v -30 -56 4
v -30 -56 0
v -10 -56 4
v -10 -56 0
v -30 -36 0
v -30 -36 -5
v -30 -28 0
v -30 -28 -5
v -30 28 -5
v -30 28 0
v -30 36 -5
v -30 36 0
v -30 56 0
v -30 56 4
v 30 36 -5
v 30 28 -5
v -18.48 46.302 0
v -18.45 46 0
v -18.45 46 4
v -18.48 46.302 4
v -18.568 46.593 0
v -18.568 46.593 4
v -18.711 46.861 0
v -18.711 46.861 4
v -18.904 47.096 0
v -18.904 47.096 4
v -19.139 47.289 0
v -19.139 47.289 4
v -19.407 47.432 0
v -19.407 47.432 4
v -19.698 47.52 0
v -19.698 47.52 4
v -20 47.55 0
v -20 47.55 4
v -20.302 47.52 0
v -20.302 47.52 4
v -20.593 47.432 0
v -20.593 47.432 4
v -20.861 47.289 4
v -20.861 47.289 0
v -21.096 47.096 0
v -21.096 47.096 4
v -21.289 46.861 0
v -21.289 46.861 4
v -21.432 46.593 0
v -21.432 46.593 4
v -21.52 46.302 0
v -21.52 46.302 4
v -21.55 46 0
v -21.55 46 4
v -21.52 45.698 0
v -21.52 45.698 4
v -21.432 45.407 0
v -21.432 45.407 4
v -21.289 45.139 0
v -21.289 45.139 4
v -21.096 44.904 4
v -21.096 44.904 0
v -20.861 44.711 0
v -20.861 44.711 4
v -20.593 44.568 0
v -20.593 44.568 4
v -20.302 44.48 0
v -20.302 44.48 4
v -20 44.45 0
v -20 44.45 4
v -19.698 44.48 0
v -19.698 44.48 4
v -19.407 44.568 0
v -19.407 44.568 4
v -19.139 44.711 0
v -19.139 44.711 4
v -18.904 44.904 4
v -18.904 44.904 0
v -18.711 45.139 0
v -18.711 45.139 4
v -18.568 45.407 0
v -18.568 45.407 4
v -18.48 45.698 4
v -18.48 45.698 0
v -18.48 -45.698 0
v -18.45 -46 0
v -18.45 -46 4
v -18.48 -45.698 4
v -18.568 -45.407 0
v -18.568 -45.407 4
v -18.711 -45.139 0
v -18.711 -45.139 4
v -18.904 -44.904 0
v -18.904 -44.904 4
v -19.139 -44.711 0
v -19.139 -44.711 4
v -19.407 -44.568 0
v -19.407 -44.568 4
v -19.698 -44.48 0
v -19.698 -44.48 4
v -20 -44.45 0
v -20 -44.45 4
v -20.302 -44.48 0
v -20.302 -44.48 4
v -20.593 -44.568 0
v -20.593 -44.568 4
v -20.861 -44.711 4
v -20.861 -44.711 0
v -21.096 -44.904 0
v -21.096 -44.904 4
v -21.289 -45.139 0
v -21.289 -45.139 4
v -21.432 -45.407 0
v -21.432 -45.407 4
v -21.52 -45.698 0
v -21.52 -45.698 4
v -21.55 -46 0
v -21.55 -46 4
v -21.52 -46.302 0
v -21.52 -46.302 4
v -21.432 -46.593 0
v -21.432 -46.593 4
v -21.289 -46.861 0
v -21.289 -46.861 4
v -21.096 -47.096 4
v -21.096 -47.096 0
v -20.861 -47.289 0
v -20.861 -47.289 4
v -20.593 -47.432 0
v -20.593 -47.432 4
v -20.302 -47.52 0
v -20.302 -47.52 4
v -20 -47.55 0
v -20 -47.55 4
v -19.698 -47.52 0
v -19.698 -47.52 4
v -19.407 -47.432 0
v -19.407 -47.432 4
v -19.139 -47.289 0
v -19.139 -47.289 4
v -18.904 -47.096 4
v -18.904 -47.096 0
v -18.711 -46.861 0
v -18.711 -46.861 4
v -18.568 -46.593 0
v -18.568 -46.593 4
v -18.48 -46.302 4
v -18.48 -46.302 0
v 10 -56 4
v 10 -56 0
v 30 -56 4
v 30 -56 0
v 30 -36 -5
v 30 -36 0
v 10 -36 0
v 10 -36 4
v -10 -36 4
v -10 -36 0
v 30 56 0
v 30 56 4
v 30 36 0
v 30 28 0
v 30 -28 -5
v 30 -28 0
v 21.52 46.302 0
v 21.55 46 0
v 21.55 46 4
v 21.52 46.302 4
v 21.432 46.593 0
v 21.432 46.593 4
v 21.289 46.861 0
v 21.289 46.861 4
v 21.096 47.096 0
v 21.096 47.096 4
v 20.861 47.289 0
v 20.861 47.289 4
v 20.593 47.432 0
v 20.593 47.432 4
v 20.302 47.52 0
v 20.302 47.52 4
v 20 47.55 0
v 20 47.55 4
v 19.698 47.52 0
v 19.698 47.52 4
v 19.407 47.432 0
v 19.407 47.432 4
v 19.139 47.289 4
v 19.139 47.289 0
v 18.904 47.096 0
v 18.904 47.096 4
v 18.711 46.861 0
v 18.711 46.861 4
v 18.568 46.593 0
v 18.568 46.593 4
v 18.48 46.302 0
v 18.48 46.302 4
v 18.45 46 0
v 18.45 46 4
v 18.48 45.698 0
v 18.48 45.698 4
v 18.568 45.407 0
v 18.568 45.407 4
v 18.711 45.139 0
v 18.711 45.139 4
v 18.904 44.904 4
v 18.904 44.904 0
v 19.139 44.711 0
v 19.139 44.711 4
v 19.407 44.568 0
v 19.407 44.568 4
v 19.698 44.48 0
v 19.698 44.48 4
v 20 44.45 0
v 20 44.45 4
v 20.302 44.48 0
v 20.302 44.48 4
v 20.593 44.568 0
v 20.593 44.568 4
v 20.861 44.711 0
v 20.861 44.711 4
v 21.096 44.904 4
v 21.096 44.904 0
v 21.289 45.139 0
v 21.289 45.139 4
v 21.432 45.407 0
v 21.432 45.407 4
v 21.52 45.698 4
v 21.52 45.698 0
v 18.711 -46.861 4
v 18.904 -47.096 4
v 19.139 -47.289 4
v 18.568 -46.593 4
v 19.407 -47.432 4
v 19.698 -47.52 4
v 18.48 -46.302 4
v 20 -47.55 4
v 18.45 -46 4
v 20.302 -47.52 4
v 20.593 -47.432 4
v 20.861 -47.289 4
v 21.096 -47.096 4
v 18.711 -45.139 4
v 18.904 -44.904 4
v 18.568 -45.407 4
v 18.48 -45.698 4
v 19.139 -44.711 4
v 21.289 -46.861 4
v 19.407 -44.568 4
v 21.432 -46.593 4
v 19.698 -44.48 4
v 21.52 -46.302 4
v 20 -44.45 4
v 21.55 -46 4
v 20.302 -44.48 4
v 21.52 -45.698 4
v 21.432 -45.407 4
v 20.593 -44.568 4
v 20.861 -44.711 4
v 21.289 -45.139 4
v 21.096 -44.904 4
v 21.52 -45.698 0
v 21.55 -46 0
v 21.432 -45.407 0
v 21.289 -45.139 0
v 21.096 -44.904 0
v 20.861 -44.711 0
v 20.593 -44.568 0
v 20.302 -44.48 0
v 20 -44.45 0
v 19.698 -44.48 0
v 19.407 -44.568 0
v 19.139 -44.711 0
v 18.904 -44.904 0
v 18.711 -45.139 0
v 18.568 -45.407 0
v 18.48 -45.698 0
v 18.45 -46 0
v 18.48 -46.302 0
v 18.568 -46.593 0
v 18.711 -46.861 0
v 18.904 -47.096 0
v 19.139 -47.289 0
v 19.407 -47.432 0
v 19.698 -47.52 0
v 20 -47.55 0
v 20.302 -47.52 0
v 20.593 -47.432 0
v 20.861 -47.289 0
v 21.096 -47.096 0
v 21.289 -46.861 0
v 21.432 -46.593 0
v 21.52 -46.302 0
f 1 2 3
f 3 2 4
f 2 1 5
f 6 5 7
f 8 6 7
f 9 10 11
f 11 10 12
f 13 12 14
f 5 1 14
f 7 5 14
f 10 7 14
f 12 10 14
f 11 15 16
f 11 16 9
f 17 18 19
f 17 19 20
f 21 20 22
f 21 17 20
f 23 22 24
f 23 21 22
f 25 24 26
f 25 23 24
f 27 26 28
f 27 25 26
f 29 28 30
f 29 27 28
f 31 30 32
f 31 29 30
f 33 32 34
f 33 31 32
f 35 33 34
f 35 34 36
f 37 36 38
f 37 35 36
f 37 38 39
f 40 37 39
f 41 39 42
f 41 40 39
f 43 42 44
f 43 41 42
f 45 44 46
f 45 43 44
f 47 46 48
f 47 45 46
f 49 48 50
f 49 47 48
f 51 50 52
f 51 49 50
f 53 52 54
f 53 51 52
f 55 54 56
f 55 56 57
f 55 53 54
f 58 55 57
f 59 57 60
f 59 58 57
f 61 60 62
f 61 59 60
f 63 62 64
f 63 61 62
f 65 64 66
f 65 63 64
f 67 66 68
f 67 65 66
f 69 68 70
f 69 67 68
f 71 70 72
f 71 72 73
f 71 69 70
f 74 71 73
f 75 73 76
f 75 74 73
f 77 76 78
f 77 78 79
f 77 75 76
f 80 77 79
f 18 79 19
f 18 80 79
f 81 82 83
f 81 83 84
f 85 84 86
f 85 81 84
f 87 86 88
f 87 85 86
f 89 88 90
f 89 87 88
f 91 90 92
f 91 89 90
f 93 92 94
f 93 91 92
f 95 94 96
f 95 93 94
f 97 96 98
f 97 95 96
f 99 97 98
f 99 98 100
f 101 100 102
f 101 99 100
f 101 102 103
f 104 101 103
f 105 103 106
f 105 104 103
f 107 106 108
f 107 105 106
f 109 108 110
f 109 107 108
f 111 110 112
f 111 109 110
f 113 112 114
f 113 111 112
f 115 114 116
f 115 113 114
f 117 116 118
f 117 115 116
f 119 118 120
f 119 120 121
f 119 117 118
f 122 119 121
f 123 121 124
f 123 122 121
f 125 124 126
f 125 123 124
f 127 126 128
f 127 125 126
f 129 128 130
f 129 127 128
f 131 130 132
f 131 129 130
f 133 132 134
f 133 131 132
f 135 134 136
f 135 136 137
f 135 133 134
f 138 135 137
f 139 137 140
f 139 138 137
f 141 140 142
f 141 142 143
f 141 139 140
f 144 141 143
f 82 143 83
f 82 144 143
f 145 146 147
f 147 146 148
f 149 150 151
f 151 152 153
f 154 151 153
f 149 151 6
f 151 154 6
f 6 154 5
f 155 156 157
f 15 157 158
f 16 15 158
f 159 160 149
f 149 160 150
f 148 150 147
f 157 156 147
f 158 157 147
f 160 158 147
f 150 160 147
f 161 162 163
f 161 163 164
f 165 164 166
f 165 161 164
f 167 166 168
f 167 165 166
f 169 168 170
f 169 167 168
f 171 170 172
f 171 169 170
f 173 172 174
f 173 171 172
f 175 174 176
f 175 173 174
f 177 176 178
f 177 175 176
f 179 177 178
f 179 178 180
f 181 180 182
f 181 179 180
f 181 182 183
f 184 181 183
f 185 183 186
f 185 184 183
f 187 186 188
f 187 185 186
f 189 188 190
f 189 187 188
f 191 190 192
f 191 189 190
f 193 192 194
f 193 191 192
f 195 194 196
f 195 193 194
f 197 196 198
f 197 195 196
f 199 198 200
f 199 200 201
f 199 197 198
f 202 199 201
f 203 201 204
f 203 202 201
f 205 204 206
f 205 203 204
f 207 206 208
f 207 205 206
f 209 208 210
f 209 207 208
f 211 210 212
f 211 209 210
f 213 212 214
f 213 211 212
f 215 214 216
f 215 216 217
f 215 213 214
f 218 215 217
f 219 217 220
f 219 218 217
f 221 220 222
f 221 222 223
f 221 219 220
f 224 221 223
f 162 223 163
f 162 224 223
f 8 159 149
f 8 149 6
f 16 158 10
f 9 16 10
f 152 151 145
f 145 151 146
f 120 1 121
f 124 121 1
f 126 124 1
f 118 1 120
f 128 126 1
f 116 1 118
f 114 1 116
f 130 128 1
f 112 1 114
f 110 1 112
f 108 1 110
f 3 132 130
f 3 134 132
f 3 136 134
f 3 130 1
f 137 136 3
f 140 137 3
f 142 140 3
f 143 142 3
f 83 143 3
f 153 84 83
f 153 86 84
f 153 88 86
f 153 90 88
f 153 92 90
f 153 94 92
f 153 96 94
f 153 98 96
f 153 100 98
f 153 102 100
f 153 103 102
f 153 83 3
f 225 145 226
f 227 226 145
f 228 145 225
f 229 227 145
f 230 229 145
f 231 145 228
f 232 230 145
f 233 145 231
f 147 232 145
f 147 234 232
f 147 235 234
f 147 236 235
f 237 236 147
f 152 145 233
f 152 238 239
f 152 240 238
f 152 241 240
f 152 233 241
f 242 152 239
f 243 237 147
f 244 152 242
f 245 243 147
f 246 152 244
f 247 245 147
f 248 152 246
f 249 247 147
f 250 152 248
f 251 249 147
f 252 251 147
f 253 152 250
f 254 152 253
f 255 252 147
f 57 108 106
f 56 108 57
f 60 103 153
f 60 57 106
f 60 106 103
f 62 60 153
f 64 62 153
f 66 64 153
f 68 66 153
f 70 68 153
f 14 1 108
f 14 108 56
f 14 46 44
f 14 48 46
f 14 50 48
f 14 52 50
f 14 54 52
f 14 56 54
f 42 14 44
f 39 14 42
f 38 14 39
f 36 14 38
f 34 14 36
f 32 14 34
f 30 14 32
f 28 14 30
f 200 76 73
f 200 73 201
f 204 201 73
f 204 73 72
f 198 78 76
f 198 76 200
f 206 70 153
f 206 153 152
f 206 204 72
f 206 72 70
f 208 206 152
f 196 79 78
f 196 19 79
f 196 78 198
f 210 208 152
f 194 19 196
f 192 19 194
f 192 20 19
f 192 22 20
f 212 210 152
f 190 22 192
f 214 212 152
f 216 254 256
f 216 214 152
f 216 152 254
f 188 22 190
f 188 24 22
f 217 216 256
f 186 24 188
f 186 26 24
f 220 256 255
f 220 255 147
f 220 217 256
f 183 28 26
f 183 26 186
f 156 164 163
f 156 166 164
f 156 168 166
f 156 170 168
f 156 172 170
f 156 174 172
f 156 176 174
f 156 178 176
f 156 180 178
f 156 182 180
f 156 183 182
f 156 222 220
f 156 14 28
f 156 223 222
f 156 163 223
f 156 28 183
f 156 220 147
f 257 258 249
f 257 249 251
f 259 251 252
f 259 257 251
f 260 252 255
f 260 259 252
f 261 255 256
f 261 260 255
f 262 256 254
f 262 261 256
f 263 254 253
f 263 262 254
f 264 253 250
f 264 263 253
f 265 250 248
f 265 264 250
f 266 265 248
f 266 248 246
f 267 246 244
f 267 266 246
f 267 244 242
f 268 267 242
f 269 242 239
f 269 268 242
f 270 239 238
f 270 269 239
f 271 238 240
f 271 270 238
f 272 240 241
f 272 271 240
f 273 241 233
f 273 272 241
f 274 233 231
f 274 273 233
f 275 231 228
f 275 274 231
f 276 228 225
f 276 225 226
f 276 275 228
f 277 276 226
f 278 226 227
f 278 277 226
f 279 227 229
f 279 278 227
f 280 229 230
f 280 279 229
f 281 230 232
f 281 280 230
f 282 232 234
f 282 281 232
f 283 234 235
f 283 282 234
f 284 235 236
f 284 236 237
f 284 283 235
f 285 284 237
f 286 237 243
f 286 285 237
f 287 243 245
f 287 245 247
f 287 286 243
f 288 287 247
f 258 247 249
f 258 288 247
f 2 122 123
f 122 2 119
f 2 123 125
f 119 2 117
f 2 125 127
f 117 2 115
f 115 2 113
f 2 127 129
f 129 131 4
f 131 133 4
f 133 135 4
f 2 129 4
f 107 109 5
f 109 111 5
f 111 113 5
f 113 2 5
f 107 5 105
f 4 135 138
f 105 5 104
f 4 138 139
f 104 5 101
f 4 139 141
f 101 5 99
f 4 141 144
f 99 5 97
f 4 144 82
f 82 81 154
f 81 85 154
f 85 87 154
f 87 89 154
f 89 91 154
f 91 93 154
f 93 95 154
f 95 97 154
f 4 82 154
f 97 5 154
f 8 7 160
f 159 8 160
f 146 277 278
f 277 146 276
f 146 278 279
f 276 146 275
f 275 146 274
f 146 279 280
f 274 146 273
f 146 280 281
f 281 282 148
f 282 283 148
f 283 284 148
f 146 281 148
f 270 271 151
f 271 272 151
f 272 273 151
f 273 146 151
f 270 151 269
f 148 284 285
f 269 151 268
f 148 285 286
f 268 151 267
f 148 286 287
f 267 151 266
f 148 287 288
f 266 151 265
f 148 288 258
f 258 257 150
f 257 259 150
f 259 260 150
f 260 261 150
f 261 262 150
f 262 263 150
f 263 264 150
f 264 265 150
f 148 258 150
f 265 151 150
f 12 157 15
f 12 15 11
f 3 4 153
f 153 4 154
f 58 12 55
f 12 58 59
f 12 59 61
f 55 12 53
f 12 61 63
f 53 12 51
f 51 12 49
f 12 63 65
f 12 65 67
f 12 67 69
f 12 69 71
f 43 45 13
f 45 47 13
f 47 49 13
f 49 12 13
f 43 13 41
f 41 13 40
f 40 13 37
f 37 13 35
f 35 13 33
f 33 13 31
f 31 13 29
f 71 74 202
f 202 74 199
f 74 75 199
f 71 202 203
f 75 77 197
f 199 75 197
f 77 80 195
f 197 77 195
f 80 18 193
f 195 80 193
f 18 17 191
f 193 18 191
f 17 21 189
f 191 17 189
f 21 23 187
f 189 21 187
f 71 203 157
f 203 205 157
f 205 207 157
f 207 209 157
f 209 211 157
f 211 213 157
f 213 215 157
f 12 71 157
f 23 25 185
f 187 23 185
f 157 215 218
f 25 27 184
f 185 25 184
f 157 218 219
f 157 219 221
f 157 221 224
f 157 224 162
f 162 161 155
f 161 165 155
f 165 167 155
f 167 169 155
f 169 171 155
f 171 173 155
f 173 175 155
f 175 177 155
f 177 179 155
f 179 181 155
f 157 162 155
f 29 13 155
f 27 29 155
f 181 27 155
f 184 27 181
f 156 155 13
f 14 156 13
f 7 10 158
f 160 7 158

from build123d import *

# Parameters (mm, degrees)
SKETCH1_R           = 1.55
BOSS_EXTRUDE1_DEPTH = 4
SKETCH2_W           = 60
SKETCH2_H           = 8
BOSS_EXTRUDE2_DEPTH = 5


with BuildPart() as part:
    # Sketch1 → Boss-Extrude1 (new body)
    with BuildSketch(Plane.XY):
        Polygon((-30, 56), (-30, -56), (-10, -56), (-10, -36), (10, -36), (10, -56), (30, -56), (30, 56), align=None)
        with Locations((-20, -46)):
            Circle(SKETCH1_R, mode=Mode.SUBTRACT)
        with Locations((20, -46)):
            Circle(SKETCH1_R, mode=Mode.SUBTRACT)
        with Locations((-20, 46)):
            Circle(SKETCH1_R, mode=Mode.SUBTRACT)
        with Locations((20, 46)):
            Circle(SKETCH1_R, mode=Mode.SUBTRACT)
    extrude(amount=BOSS_EXTRUDE1_DEPTH)

    # Sketch2 → Boss-Extrude2 (add)
    with BuildSketch(Plane(origin=(0, 0, 0), x_dir=(-1, 0, 0), z_dir=(0, 0, -1))):
        with Locations((0, 32)):
            Rectangle(SKETCH2_W, SKETCH2_H)
        Polygon((30, -28), (-30, -28), (-30, -36), (-10, -36), (10, -36), (30, -36), align=None)
    extrude(amount=BOSS_EXTRUDE2_DEPTH)


solid = part.part
